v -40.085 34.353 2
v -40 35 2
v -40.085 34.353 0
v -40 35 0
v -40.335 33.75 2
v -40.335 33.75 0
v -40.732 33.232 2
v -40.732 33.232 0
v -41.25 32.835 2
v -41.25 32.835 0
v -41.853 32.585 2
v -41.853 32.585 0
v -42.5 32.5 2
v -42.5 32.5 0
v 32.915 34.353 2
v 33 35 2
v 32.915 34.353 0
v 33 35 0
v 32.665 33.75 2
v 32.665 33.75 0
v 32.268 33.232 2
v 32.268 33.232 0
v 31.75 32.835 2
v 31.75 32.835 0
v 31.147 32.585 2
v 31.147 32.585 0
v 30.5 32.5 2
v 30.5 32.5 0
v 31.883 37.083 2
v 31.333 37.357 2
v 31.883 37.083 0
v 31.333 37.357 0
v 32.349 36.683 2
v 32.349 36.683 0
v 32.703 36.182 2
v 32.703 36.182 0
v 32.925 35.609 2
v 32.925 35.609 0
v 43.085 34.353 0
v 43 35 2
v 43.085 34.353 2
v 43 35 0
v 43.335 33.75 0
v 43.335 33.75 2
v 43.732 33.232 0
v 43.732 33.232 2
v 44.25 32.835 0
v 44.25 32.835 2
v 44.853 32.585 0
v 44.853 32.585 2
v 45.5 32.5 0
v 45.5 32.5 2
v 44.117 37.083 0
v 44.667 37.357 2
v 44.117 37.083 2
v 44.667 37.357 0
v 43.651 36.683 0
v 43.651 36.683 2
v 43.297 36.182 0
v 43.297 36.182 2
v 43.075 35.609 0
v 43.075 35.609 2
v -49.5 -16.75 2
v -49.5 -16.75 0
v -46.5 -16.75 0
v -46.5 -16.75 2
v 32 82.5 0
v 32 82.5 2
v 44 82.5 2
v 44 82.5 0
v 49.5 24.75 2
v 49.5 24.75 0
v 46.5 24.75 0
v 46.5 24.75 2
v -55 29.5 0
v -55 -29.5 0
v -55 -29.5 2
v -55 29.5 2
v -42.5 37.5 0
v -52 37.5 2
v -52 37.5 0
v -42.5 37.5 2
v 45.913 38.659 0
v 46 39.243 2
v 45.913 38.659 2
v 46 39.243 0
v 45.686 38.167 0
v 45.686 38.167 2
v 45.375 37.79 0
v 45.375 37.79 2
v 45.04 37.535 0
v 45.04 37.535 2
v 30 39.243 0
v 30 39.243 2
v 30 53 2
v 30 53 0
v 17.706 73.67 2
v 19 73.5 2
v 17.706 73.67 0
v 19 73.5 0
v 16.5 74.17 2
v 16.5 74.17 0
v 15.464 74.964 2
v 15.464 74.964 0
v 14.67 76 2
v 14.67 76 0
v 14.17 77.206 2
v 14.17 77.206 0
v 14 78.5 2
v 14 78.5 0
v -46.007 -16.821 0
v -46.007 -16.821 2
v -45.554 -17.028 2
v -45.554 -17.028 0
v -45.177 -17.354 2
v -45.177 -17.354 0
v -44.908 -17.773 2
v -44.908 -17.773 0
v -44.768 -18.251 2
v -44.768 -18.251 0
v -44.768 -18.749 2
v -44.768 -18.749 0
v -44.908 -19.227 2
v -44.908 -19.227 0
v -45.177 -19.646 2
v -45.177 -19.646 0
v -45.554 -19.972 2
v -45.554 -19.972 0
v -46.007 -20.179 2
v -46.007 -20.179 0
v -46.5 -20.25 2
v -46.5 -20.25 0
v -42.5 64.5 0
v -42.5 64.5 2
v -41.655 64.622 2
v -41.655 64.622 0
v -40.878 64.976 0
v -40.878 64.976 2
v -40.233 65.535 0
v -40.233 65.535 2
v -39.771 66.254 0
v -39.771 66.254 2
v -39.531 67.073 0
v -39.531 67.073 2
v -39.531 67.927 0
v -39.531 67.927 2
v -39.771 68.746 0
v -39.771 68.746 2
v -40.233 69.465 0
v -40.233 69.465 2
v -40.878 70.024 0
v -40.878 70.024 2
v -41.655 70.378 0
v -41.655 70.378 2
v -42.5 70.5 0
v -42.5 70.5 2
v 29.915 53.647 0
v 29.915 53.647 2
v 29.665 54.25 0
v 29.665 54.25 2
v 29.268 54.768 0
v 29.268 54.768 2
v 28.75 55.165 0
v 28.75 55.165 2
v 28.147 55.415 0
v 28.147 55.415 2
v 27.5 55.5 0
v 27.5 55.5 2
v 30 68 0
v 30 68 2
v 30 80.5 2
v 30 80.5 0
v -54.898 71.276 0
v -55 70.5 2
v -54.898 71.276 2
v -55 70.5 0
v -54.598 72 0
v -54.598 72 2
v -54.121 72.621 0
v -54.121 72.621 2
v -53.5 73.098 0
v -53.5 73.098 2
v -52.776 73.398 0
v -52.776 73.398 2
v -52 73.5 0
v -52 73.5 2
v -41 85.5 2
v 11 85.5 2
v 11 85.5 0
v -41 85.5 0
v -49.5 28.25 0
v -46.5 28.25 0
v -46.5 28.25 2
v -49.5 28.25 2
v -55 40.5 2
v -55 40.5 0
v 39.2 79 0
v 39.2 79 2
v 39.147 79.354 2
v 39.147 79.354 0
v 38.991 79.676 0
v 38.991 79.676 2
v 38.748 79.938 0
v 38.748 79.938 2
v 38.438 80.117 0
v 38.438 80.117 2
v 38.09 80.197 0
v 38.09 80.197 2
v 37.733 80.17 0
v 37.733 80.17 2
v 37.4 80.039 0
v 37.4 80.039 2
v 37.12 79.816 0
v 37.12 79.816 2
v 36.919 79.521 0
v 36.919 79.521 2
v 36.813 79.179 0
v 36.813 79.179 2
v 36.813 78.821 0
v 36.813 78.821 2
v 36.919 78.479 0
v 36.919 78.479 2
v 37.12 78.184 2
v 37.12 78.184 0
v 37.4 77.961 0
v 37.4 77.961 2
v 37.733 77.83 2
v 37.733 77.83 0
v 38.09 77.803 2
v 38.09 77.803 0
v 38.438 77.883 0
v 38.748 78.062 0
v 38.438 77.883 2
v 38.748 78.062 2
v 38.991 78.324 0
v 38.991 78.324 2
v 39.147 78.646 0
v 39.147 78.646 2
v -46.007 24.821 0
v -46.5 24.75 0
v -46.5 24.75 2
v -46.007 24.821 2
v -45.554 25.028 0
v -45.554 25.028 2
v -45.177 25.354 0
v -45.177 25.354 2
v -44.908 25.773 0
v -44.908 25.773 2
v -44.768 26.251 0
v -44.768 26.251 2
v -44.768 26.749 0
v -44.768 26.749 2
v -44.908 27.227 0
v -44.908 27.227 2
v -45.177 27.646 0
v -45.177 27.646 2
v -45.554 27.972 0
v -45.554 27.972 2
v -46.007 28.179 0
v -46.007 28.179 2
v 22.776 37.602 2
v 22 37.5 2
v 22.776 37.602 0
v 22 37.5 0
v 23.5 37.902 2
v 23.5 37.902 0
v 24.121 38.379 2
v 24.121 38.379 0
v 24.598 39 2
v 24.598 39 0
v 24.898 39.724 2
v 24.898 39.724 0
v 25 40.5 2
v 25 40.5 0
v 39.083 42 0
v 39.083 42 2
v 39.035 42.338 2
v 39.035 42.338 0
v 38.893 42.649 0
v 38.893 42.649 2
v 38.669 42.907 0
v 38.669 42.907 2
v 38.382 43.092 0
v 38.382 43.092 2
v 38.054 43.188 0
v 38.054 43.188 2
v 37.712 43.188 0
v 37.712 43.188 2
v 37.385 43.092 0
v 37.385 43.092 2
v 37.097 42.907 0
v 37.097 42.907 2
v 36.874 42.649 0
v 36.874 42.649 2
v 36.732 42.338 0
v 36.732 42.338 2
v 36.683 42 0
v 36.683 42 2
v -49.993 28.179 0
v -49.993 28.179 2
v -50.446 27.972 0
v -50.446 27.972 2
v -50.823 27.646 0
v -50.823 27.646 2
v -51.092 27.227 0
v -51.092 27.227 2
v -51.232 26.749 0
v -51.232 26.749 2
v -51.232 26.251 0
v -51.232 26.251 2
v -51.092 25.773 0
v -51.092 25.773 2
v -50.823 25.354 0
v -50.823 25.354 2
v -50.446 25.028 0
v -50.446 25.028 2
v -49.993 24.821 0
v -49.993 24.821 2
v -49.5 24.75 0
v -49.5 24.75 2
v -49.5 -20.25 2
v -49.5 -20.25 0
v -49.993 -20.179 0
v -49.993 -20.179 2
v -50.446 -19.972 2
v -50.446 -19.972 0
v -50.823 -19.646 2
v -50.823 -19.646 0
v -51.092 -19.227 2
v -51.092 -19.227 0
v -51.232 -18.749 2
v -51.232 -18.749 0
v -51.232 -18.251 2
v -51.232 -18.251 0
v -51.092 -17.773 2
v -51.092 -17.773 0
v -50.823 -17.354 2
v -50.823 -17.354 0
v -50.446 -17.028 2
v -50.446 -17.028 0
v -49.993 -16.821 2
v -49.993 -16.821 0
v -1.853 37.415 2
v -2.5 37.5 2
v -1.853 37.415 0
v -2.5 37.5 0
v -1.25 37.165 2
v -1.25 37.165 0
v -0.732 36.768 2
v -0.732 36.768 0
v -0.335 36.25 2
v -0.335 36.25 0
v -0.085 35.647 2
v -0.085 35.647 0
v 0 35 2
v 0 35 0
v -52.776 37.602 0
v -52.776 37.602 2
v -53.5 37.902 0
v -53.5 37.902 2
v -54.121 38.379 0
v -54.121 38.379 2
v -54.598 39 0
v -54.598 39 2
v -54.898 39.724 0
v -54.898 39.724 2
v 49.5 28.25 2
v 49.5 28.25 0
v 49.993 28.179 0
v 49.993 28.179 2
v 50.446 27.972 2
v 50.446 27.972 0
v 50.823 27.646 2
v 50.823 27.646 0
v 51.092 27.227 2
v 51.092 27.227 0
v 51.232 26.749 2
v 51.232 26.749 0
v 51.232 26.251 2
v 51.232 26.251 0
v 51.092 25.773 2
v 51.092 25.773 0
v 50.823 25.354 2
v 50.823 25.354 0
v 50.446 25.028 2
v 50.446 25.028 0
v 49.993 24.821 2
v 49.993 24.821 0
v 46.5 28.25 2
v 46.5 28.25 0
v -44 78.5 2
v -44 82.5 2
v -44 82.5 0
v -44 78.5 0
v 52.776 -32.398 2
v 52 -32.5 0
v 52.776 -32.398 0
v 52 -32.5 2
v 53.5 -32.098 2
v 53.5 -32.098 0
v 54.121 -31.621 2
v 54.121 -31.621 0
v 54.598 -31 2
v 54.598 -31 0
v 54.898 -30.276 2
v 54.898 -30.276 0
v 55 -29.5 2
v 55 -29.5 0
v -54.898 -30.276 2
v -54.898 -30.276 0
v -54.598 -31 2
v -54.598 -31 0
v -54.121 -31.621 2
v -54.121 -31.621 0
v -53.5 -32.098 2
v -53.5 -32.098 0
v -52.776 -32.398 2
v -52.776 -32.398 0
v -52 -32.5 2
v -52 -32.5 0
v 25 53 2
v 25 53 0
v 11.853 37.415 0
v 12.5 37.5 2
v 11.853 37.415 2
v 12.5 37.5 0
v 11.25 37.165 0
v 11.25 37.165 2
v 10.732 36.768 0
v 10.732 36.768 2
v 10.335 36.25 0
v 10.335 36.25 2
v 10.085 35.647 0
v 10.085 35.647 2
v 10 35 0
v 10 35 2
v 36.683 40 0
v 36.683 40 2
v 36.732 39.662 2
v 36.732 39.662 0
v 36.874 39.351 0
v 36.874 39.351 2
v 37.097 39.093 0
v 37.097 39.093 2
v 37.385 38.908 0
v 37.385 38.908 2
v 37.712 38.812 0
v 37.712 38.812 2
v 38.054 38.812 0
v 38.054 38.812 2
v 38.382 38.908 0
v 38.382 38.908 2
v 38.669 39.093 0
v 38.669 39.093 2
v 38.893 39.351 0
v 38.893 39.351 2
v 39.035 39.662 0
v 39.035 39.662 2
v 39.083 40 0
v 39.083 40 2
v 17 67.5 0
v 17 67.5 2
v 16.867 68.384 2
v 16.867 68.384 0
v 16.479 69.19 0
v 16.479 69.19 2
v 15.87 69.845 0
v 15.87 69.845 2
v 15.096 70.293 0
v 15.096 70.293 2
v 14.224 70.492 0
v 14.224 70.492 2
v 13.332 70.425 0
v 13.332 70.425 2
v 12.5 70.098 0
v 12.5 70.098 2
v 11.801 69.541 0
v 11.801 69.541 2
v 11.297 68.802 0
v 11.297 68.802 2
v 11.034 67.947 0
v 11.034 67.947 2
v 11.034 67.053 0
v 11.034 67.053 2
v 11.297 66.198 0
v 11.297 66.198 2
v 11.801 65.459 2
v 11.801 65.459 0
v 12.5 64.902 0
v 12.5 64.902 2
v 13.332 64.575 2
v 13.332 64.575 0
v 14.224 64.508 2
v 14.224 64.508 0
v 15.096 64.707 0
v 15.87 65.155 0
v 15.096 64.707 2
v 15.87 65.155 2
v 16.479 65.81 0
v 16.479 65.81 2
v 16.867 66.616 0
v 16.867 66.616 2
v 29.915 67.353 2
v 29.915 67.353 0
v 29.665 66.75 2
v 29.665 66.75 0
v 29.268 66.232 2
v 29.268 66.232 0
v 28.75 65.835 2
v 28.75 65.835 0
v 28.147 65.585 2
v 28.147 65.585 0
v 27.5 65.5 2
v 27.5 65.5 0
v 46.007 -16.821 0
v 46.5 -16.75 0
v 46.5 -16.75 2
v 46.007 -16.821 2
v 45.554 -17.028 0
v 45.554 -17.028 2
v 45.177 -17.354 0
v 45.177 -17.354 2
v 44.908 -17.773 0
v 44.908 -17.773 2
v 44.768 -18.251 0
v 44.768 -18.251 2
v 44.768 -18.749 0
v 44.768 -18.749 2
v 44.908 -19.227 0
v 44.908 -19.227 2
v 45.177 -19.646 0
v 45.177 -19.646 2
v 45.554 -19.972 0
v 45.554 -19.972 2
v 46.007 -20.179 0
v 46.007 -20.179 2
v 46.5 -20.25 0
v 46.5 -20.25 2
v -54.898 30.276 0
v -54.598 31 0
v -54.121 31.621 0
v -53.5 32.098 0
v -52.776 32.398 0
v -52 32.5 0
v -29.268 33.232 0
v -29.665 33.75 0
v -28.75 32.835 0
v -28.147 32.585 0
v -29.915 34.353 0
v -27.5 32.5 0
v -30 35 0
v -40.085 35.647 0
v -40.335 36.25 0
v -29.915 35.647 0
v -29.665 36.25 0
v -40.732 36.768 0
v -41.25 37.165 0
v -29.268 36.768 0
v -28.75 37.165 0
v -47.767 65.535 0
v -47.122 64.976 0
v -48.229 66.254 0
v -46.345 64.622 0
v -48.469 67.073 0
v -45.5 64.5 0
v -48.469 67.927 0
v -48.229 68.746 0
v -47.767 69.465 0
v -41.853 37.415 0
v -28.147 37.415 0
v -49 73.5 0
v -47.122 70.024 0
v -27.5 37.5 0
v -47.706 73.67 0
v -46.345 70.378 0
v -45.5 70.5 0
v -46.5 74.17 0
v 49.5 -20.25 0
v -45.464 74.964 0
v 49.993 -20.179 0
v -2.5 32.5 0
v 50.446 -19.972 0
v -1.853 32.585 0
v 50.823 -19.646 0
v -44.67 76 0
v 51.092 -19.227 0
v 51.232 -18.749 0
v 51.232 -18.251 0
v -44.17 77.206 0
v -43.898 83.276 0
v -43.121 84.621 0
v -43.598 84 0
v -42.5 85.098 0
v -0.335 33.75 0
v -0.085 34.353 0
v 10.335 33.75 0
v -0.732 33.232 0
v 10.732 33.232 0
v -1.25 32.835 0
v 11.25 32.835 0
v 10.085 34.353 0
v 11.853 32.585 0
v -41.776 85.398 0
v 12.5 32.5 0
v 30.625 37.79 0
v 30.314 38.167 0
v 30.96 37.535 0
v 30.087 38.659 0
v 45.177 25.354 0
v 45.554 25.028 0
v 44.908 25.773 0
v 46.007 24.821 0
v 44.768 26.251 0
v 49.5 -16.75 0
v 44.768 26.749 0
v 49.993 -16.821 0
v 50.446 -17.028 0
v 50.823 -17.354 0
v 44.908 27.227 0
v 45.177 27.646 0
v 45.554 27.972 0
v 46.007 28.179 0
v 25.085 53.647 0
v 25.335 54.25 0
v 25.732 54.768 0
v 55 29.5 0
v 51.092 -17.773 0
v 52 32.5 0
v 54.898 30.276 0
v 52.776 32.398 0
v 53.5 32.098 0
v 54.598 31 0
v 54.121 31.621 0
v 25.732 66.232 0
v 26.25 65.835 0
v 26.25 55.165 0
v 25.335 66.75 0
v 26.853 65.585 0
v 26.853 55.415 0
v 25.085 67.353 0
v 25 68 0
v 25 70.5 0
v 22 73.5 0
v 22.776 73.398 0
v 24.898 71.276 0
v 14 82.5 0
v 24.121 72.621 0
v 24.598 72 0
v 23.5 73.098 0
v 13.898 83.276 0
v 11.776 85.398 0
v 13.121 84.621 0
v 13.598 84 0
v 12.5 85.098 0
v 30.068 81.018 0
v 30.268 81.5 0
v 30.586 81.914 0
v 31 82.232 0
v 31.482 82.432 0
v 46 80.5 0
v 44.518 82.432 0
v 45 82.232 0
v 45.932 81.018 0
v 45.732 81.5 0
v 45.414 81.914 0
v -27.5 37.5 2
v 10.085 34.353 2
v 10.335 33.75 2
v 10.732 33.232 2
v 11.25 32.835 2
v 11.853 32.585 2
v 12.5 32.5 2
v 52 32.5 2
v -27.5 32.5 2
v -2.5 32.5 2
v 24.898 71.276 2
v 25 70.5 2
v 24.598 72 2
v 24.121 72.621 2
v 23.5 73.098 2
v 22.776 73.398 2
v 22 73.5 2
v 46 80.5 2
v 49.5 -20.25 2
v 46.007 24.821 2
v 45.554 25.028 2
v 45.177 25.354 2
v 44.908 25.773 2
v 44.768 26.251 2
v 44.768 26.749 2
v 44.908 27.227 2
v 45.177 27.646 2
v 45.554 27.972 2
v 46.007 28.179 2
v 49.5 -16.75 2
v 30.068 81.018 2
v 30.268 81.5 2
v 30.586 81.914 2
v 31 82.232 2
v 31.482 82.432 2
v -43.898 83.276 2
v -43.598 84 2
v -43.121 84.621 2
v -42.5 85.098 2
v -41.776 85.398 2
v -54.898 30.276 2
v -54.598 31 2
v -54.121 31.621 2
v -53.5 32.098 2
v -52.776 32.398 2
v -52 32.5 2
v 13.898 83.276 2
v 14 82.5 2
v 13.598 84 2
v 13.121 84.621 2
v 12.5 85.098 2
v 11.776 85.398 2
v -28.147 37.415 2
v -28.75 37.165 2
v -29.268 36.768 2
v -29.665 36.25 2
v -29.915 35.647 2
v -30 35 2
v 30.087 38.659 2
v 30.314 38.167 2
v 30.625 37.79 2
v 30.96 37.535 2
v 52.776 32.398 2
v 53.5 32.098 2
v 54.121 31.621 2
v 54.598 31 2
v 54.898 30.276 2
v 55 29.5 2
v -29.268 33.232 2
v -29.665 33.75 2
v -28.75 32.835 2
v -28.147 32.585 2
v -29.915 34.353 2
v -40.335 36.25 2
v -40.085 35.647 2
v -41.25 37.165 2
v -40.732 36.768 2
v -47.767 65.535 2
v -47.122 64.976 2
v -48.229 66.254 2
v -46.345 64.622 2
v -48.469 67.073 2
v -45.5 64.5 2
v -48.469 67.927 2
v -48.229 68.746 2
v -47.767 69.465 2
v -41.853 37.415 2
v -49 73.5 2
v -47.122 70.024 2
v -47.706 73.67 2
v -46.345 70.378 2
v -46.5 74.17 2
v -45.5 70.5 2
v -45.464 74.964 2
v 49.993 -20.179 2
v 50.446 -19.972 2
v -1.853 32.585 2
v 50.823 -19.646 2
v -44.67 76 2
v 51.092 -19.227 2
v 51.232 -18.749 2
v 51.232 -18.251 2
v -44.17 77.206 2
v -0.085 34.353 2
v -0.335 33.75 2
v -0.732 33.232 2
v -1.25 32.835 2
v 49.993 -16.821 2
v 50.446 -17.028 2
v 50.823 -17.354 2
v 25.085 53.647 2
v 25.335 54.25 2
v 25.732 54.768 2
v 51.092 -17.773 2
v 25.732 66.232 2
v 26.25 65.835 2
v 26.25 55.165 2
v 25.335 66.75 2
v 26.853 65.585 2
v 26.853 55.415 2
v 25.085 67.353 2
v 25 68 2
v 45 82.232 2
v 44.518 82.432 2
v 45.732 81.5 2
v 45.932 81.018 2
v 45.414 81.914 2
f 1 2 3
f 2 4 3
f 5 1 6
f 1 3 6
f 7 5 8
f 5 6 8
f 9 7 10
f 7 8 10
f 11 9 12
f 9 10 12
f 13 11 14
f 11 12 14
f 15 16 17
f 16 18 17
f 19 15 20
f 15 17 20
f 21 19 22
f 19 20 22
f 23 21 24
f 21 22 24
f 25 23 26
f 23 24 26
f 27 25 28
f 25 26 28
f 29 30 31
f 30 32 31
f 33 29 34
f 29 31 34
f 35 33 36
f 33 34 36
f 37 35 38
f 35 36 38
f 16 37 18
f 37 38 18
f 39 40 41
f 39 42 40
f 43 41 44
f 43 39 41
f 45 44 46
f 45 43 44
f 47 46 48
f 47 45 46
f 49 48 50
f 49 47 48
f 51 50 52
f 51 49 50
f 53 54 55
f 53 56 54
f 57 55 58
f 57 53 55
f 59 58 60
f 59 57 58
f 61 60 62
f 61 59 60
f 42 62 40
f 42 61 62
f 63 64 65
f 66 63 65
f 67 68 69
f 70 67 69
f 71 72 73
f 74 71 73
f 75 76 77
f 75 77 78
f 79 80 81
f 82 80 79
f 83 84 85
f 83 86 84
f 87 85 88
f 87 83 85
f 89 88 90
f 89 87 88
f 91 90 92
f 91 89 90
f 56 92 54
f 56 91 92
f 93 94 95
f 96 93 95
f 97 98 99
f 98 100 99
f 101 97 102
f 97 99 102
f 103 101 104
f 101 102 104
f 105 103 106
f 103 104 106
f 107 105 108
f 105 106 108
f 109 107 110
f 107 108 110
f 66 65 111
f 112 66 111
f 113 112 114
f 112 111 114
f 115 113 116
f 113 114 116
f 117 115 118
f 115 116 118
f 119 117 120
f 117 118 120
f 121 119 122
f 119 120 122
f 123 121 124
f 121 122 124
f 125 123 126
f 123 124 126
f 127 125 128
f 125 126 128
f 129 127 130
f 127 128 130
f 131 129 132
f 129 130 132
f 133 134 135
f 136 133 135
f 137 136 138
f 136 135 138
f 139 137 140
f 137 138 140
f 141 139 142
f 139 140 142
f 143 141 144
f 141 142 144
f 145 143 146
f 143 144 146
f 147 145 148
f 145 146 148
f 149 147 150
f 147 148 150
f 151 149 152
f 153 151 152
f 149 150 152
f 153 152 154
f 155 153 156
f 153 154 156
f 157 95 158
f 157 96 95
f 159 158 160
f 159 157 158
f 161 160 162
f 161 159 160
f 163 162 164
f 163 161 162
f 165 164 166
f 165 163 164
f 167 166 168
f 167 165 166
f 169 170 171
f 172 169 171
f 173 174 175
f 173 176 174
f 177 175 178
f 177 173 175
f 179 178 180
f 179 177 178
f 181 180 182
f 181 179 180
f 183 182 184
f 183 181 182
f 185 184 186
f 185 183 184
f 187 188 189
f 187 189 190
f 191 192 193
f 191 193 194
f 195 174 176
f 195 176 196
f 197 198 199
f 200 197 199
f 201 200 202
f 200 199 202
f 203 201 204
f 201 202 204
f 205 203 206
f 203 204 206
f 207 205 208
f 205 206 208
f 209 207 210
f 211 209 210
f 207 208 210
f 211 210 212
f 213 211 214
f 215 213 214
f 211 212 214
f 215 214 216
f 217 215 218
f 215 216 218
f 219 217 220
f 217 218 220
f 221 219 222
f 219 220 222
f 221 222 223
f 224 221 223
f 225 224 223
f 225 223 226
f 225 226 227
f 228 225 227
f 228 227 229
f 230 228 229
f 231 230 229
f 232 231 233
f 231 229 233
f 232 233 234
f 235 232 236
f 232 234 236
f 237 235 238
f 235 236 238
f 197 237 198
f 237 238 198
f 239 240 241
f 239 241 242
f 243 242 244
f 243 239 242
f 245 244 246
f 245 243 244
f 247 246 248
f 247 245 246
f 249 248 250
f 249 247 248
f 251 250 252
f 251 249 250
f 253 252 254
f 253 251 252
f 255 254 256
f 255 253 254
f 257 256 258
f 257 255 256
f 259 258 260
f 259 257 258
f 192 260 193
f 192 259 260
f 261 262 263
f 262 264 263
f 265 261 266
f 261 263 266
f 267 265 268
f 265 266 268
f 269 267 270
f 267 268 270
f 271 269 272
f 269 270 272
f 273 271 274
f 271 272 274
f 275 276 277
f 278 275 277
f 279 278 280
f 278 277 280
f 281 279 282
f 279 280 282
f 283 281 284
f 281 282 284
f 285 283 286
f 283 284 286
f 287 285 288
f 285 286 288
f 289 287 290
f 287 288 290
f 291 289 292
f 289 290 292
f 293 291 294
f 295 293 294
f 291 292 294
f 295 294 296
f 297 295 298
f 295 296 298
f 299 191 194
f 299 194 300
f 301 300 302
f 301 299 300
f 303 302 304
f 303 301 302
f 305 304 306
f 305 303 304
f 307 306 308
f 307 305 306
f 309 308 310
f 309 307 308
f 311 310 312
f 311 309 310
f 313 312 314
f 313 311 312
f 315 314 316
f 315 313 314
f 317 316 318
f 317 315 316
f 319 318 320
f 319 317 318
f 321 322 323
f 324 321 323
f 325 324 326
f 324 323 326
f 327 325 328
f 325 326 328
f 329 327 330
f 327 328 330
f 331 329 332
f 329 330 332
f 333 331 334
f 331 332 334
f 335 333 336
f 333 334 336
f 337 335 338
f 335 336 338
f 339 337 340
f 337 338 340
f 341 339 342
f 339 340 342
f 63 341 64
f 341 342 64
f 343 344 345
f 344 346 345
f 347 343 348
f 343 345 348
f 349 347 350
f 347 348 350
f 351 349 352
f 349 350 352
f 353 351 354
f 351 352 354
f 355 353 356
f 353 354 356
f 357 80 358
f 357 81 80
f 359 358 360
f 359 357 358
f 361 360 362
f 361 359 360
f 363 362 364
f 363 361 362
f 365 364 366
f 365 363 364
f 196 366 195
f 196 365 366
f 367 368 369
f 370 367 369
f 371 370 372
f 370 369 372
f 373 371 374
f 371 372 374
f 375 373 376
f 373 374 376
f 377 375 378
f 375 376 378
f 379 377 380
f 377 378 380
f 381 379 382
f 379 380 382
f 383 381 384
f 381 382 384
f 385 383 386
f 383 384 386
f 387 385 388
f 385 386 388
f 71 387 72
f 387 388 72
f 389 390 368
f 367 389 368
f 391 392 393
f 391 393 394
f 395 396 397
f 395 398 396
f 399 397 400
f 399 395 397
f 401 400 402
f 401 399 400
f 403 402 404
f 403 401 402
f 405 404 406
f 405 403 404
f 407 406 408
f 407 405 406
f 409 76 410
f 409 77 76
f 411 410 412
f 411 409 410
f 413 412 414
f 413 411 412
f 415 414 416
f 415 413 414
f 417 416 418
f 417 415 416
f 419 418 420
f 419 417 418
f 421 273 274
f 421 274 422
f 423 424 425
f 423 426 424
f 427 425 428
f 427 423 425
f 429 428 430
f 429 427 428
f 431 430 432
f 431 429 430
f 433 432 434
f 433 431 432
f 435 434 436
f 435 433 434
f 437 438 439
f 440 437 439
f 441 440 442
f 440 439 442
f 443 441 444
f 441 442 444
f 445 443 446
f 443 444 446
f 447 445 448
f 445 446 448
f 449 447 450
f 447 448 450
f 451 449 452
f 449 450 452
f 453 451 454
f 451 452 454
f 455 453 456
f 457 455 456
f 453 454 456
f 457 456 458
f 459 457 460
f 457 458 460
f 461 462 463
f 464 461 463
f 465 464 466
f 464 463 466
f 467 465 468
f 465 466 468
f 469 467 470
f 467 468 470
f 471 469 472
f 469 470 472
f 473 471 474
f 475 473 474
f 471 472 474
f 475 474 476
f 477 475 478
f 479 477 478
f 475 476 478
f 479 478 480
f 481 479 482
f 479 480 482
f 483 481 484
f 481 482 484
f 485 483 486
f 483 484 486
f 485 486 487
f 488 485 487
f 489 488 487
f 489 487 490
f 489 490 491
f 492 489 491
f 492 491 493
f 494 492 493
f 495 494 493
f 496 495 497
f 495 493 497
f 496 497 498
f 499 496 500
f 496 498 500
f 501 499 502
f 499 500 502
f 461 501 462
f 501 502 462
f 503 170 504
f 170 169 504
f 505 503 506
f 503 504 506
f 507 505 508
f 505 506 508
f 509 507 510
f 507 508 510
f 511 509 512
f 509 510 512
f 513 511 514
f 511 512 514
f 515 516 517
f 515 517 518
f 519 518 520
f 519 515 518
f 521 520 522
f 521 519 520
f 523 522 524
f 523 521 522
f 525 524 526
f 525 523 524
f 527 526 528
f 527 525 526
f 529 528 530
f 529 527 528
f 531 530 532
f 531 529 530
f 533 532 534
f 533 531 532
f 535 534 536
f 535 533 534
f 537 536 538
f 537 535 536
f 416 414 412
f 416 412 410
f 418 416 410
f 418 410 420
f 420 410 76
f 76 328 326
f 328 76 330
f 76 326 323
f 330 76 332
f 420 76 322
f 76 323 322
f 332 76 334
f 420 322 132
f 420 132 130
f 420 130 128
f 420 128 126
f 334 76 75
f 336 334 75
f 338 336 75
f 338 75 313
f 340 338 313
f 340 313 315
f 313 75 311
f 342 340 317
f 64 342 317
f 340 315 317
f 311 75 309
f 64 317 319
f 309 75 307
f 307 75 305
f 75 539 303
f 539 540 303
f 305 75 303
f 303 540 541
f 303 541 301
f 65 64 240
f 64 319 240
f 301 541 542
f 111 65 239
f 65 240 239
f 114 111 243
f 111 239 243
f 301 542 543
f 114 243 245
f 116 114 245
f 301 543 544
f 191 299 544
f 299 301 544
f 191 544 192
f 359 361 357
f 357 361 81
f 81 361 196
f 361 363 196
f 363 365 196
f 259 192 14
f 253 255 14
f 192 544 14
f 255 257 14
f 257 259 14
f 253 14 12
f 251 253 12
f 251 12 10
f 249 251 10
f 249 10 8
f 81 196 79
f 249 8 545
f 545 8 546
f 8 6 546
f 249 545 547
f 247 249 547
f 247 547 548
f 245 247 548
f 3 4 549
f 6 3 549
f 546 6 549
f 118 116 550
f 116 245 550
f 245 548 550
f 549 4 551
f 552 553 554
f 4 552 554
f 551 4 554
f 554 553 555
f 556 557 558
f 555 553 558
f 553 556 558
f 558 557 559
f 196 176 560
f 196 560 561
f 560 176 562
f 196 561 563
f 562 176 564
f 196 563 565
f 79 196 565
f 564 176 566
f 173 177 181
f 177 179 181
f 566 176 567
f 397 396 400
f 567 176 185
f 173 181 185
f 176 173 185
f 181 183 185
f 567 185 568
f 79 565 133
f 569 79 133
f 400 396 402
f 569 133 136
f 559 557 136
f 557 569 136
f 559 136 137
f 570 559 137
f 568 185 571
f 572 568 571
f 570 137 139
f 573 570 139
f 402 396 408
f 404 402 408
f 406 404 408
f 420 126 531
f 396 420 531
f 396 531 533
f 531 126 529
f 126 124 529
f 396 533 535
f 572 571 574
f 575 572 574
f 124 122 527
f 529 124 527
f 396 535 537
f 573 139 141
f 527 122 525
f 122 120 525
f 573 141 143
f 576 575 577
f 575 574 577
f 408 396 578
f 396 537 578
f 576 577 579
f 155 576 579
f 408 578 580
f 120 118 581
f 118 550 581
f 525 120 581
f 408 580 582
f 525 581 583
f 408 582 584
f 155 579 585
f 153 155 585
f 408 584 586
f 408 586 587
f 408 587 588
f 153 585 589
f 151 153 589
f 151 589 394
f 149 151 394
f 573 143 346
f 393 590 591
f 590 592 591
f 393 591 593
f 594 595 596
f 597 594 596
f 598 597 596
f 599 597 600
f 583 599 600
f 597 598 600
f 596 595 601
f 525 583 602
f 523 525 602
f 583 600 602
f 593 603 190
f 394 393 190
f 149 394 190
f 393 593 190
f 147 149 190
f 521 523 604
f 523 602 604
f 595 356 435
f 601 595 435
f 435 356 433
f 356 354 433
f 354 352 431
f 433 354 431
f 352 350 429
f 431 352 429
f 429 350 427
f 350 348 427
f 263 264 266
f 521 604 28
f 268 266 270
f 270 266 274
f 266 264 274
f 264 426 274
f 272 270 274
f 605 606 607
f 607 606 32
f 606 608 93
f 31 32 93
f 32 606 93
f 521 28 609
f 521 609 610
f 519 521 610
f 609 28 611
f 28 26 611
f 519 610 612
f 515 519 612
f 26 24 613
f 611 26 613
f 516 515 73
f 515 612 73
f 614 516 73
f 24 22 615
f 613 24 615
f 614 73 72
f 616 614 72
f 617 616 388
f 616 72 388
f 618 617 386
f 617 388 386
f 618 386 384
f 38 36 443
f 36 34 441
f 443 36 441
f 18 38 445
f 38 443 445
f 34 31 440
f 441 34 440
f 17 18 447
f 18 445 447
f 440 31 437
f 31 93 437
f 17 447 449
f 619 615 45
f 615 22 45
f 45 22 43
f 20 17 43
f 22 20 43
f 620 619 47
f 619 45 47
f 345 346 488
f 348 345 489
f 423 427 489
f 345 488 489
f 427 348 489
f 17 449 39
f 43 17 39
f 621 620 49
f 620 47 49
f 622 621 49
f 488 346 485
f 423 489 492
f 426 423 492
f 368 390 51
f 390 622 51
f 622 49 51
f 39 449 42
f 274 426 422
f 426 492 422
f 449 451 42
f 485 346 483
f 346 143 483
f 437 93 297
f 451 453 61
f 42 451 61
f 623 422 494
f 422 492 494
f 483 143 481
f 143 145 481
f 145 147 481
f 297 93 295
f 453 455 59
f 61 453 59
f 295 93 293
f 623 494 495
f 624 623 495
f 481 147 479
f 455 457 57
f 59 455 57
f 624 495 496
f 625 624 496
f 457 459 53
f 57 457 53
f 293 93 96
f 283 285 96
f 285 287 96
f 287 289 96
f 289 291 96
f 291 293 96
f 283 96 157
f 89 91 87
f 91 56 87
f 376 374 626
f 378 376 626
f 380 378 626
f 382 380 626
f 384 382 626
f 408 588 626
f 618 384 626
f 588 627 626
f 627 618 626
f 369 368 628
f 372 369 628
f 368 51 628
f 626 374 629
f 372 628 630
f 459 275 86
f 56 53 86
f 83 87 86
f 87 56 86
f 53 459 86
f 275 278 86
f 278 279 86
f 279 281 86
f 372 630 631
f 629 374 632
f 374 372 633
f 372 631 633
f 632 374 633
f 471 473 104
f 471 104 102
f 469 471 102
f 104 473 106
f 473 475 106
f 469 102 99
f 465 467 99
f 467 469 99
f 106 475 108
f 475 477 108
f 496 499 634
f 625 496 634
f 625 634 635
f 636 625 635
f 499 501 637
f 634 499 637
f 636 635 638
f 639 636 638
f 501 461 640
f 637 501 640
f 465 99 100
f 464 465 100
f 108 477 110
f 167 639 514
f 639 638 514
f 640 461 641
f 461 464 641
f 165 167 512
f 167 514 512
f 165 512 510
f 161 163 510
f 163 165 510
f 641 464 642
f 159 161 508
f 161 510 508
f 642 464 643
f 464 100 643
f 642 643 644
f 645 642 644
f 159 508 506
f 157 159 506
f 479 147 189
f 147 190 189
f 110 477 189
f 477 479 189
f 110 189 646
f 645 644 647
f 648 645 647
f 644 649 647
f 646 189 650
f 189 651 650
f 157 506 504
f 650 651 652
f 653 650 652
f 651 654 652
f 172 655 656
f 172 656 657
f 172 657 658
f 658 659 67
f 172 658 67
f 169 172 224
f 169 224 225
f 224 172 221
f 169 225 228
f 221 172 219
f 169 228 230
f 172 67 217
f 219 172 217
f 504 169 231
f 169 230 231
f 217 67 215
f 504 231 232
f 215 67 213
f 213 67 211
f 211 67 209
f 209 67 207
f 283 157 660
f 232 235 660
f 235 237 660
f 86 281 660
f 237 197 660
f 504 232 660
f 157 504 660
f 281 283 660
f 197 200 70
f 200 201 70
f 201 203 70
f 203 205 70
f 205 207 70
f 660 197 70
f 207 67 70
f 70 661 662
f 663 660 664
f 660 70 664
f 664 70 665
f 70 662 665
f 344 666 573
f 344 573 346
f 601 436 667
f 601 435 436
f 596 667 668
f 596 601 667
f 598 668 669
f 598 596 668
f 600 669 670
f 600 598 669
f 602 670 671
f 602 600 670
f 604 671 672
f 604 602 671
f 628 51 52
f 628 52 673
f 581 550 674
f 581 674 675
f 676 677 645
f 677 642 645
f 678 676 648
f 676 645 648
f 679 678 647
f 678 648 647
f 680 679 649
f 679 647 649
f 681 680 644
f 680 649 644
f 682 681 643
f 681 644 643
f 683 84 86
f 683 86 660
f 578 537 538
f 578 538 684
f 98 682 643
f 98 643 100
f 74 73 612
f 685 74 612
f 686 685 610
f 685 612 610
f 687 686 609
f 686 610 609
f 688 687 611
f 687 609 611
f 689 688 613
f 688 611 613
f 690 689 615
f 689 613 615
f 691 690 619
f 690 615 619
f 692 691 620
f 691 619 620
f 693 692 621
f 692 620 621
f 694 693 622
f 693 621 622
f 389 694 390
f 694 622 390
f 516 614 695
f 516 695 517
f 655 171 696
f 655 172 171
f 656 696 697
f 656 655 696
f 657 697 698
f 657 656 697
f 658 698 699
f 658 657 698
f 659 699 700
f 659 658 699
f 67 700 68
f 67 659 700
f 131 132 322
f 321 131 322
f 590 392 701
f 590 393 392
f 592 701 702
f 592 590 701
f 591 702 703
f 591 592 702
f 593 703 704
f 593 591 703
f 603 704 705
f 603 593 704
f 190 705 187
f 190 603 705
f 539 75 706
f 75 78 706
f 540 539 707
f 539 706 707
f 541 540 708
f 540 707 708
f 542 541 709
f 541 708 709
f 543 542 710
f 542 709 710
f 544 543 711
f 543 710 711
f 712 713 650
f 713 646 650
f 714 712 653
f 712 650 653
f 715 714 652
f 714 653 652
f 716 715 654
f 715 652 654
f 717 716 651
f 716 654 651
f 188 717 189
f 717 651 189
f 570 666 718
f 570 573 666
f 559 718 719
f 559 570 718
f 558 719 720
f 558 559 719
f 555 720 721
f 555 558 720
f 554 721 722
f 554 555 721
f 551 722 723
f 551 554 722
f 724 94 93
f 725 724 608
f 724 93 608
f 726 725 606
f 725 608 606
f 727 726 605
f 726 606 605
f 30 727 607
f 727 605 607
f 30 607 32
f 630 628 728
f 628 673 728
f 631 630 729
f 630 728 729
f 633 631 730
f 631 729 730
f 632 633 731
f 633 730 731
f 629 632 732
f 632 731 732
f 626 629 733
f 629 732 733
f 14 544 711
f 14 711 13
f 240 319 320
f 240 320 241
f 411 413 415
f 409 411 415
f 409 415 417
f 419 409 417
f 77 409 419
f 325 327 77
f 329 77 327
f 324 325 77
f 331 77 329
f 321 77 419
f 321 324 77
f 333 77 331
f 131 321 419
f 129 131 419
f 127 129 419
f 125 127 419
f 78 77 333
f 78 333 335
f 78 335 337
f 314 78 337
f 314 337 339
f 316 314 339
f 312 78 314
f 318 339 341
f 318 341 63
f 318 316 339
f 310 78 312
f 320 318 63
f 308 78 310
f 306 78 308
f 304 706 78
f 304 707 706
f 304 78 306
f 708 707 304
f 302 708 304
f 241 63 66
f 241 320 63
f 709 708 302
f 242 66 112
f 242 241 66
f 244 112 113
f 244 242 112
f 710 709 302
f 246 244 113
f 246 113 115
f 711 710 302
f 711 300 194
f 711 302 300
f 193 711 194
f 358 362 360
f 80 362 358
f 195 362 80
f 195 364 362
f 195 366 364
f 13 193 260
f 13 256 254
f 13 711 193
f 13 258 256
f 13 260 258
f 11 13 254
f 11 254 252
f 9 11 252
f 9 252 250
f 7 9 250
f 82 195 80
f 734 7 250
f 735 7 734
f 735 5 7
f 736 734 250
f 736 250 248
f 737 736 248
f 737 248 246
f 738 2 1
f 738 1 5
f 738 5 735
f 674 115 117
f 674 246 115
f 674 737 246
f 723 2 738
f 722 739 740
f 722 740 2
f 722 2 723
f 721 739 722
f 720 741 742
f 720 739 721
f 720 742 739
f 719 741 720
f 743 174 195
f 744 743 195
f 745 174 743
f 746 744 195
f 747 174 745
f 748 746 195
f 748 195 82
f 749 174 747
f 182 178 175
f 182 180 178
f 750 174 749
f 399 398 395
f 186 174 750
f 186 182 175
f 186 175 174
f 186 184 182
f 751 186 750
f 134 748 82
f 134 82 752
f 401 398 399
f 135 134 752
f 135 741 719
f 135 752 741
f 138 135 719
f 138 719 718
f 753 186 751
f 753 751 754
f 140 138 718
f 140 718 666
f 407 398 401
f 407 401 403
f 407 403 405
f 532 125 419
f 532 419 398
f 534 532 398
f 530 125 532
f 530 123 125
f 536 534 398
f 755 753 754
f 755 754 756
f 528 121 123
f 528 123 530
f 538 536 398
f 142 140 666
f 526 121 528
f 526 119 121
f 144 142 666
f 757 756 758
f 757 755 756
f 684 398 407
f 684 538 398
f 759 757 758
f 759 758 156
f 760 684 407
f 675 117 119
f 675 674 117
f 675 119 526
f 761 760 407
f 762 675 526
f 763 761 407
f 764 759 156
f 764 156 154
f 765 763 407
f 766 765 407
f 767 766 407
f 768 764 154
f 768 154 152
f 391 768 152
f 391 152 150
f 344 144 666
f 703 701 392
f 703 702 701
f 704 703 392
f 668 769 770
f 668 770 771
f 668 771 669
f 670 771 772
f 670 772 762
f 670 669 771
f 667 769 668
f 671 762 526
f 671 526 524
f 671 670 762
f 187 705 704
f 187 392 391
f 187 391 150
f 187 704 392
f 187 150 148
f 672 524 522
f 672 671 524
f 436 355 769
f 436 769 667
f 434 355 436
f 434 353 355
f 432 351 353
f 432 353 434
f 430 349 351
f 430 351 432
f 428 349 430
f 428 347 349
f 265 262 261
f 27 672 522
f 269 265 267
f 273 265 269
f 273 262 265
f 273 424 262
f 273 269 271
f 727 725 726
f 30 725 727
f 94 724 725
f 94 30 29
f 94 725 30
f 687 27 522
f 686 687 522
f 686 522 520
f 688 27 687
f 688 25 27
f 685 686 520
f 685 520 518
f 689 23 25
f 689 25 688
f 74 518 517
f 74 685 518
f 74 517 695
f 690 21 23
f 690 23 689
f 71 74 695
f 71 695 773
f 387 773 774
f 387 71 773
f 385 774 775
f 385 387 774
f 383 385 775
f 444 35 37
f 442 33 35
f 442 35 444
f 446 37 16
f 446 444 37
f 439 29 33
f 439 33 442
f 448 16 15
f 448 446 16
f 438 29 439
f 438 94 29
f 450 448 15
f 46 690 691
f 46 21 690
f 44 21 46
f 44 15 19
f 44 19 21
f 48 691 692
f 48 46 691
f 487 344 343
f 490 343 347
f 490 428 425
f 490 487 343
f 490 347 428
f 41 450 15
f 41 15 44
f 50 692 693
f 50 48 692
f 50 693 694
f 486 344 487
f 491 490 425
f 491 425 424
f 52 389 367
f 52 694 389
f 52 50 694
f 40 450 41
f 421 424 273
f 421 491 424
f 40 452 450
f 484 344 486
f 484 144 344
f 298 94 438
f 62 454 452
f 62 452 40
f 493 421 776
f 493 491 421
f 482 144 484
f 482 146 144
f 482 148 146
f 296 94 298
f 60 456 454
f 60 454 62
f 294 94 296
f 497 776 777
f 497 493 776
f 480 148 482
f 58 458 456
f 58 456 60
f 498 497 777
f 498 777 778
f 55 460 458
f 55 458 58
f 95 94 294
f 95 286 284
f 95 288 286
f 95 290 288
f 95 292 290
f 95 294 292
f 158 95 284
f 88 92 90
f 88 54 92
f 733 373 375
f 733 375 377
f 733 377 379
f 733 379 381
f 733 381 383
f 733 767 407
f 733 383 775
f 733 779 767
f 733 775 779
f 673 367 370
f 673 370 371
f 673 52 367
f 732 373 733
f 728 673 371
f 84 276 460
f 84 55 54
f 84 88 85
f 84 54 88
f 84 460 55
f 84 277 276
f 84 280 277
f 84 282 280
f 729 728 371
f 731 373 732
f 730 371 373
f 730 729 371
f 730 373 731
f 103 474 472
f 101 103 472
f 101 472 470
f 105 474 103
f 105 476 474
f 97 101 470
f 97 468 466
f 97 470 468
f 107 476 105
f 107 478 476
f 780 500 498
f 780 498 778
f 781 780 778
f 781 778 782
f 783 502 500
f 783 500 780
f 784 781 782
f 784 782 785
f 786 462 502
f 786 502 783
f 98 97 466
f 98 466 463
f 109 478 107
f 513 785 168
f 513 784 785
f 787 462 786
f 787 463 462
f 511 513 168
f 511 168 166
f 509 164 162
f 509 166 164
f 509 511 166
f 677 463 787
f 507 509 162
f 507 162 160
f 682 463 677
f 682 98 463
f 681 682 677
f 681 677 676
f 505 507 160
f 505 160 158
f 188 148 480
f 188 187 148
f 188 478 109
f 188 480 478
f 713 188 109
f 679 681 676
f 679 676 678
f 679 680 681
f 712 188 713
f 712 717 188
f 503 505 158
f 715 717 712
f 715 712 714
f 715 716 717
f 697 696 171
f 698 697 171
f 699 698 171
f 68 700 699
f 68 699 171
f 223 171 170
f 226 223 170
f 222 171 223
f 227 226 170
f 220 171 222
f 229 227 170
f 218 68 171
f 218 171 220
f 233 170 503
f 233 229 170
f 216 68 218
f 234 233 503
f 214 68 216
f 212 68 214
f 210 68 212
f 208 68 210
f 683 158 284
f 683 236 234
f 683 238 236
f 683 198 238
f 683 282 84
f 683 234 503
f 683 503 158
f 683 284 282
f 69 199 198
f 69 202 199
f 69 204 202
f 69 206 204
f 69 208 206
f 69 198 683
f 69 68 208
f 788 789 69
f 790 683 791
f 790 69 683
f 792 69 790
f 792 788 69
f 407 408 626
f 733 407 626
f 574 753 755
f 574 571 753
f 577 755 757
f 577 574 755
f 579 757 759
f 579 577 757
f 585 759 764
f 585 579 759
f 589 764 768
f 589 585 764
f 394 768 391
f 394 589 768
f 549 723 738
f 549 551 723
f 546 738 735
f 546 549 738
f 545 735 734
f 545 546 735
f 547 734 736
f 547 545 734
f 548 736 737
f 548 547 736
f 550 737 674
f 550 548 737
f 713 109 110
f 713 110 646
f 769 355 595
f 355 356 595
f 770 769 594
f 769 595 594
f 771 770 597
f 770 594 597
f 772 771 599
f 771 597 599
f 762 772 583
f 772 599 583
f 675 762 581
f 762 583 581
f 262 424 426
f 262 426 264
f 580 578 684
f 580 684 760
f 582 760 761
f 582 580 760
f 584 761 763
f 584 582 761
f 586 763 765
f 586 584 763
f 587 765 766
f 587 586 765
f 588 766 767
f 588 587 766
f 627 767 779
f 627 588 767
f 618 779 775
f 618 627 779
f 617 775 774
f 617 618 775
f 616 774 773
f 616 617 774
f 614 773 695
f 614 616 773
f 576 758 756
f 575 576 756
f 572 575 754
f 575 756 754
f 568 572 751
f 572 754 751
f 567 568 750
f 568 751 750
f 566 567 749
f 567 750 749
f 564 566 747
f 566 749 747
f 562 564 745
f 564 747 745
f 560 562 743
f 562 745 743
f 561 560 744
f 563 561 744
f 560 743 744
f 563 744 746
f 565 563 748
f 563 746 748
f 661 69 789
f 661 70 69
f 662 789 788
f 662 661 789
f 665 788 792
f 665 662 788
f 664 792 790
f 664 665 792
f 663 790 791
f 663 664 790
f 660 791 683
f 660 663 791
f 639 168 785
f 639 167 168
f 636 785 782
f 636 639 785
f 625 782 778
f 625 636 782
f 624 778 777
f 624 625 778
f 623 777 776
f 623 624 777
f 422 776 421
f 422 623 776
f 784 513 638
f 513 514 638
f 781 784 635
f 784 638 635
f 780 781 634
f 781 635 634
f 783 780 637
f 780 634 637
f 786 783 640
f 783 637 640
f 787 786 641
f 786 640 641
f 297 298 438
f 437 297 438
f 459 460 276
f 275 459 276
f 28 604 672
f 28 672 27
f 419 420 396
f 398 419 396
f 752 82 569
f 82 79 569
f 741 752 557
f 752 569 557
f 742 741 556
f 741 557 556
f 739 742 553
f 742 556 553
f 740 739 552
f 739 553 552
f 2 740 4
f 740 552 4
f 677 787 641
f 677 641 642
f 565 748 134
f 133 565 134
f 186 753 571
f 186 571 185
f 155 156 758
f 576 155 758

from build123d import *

# Parameters (mm, degrees)
SKETCH_1_W      = 110
SKETCH_1_H      = 65
EXTRUDE_1_DEPTH = 2
FILLET_1_R      = 3
SKETCH_2_R      = 3
EXTRUDE_2_DEPTH = 2
FILLET_5_R      = 3
FILLET_6_R      = 5
SKETCH_4_W      = 10
SKETCH_4_H      = 5
EXTRUDE_4_DEPTH = 2
FILLET_7_R      = 2.5
SKETCH_5_W      = 16
SKETCH_5_H      = 45
SKETCH_5_R      = 1.2
EXTRUDE_5_DEPTH = 2
SKETCH_6_W      = 10
SKETCH_6_H      = 5
SKETCH_6_W_2    = 5
SKETCH_6_H_2    = 10
EXTRUDE_6_DEPTH = 2
FILLET_8_R      = 2.5
FILLET_9_R      = 2


with BuildPart() as part:
    # ｽｹｯﾁ1 → ﾎﾞｽ - 押し出し1 (new body)
    with BuildSketch(Plane.XY):
        Rectangle(SKETCH_1_W, SKETCH_1_H)
        with BuildLine():
            Line((-49.5, 24.75), (-46.5, 24.75))
            ThreePointArc((-46.5, 24.75), (-44.75, 26.5), (-46.5, 28.25))
            Line((-46.5, 28.25), (-49.5, 28.25))
            ThreePointArc((-49.5, 28.25), (-51.25, 26.5), (-49.5, 24.75))
        make_face(mode=Mode.SUBTRACT)
        with BuildLine():
            Line((-46.5, -20.25), (-49.5, -20.25))
            ThreePointArc((-49.5, -20.25), (-51.25, -18.5), (-49.5, -16.75))
            Line((-49.5, -16.75), (-46.5, -16.75))
            ThreePointArc((-46.5, -16.75), (-44.75, -18.5), (-46.5, -20.25))
        make_face(mode=Mode.SUBTRACT)
        with BuildLine():
            Line((46.5, -20.25), (49.5, -20.25))
            ThreePointArc((49.5, -20.25), (51.25, -18.5), (49.5, -16.75))
            Line((49.5, -16.75), (46.5, -16.75))
            ThreePointArc((46.5, -16.75), (44.75, -18.5), (46.5, -20.25))
        make_face(mode=Mode.SUBTRACT)
        with BuildLine():
            Line((46.5, 28.25), (49.5, 28.25))
            ThreePointArc((49.5, 28.25), (51.25, 26.5), (49.5, 24.75))
            Line((49.5, 24.75), (46.5, 24.75))
            ThreePointArc((46.5, 24.75), (44.75, 26.5), (46.5, 28.25))
        make_face(mode=Mode.SUBTRACT)
    extrude(amount=EXTRUDE_1_DEPTH)

    # ﾌｨﾚｯﾄ1
    fillet_1_edges = [part.edges().sort_by_distance(p)[0] for p in [
        (-55, 32.5, 1),
        (55, 32.5, 1),
        (55, -32.5, 1),
        (-55, -32.5, 1),
    ]]
    fillet(fillet_1_edges, radius=FILLET_1_R)



with BuildPart() as body_2:
    # ｽｹｯﾁ2 → ﾎﾞｽ - 押し出し2 (new body)
    with BuildSketch(Plane.XY.offset(2)):
        Polygon((-55, 37.5), (25, 37.5), (25, 73.5), (14, 73.5), (14, 85.5), (-44, 85.5), (-44, 73.5), (-55, 73.5), align=None)
        with Locations((14, 67.5)):
            Circle(SKETCH_2_R, mode=Mode.SUBTRACT)
        with BuildLine():
            Line((-45.5, 64.5), (-42.5, 64.5))
            ThreePointArc((-42.5, 64.5), (-39.5, 67.5), (-42.5, 70.5))
            Line((-42.5, 70.5), (-45.5, 70.5))
            ThreePointArc((-45.5, 70.5), (-48.5, 67.5), (-45.5, 64.5))
        make_face(mode=Mode.SUBTRACT)
    extrude(amount=-EXTRUDE_2_DEPTH)

    # ﾌｨﾚｯﾄ5
    fillet_5_edges = [body_2.edges().sort_by_distance(p)[0] for p in [
        (25, 37.5, 1),
        (-55, 37.5, 1),
        (-55, 73.5, 1),
        (-44, 85.5, 1),
        (14, 85.5, 1),
        (25, 73.5, 1),
    ]]
    fillet(fillet_5_edges, radius=FILLET_5_R)

    # ﾌｨﾚｯﾄ6
    fillet_6_edges = [body_2.edges().sort_by_distance(p)[0] for p in [
        (-44, 73.5, 1),
        (14, 73.5, 1),
    ]]
    fillet(fillet_6_edges, radius=FILLET_6_R)


with BuildPart() as part_1:
    add(part.part)

    add(body_2.part)  # ﾎﾞｽ - 押し出し4 merges body 2
    # ｽｹｯﾁ4 → ﾎﾞｽ - 押し出し4 (add)
    with BuildSketch(Plane.XY.offset(2)):
        with Locations((-35, 35)):
            Rectangle(SKETCH_4_W, SKETCH_4_H)
        with Locations((5, 35)):
            Rectangle(SKETCH_4_W, SKETCH_4_H)
    extrude(amount=-EXTRUDE_4_DEPTH)

    # ﾌｨﾚｯﾄ7
    fillet_7_edges = [part_1.edges().sort_by_distance(p)[0] for p in [
        (10, 37.5, 1),
        (10, 32.5, 1),
        (0, 37.5, 1),
        (0, 32.5, 1),
        (-30, 37.5, 1),
        (-30, 32.5, 1),
        (-40, 37.5, 1),
        (-40, 32.5, 1),
    ]]
    fillet(fillet_7_edges, radius=FILLET_7_R - 0.0001)  # a hair under: the kernel refuses the full size



with BuildPart() as body_2_2:
    # ｽｹｯﾁ5 → ﾎﾞｽ - 押し出し5 (new body)
    with BuildSketch(Plane.XY.offset(2)):
        with Locations((38, 60)):
            Rectangle(SKETCH_5_W, SKETCH_5_H)
        with Locations((38, 79)):
            Circle(SKETCH_5_R, mode=Mode.SUBTRACT)
        with BuildLine():
            Line((36.683223365, 42), (36.683223365, 40))
            ThreePointArc((36.683223365, 40), (37.883223365, 38.8), (39.083223365, 40))
            Line((39.083223365, 40), (39.083223365, 42))
            ThreePointArc((39.083223365, 42), (37.883223365, 43.2), (36.683223365, 42))
        make_face(mode=Mode.SUBTRACT)
    extrude(amount=-EXTRUDE_5_DEPTH)


with BuildPart() as part_2:
    add(part_1.part)

    add(body_2_2.part)  # ﾎﾞｽ - 押し出し6 merges body 2 2
    # ｽｹｯﾁ6 → ﾎﾞｽ - 押し出し6 (add)
    with BuildSketch(Plane.XY.offset(2)):
        with Locations((38, 35)):
            Rectangle(SKETCH_6_W, SKETCH_6_H)
        with Locations((27.5, 60.5)):
            Rectangle(SKETCH_6_W_2, SKETCH_6_H_2)
    extrude(amount=-EXTRUDE_6_DEPTH)

    # ﾌｨﾚｯﾄ8
    fillet_8_edges = [part_2.edges().sort_by_distance(p)[0] for p in [
        (43, 32.5, 1),
        (43, 37.5, 1),
        (33, 32.5, 1),
        (33, 37.5, 1),
        (30, 55.5, 1),
        (25, 55.5, 1),
        (25, 65.5, 1),
        (30, 65.5, 1),
    ]]
    fillet(fillet_8_edges, radius=FILLET_8_R - 0.0001)  # a hair under: the kernel refuses the full size

    # ﾌｨﾚｯﾄ9
    fillet_9_edges = [part_2.edges().sort_by_distance(p)[0] for p in [
        (46, 82.5, 1),
        (30, 82.5, 1),
        (46, 37.5, 1),
        (30, 37.5, 1),
    ]]
    fillet(fillet_9_edges, radius=FILLET_9_R)


solid = part_2.part
